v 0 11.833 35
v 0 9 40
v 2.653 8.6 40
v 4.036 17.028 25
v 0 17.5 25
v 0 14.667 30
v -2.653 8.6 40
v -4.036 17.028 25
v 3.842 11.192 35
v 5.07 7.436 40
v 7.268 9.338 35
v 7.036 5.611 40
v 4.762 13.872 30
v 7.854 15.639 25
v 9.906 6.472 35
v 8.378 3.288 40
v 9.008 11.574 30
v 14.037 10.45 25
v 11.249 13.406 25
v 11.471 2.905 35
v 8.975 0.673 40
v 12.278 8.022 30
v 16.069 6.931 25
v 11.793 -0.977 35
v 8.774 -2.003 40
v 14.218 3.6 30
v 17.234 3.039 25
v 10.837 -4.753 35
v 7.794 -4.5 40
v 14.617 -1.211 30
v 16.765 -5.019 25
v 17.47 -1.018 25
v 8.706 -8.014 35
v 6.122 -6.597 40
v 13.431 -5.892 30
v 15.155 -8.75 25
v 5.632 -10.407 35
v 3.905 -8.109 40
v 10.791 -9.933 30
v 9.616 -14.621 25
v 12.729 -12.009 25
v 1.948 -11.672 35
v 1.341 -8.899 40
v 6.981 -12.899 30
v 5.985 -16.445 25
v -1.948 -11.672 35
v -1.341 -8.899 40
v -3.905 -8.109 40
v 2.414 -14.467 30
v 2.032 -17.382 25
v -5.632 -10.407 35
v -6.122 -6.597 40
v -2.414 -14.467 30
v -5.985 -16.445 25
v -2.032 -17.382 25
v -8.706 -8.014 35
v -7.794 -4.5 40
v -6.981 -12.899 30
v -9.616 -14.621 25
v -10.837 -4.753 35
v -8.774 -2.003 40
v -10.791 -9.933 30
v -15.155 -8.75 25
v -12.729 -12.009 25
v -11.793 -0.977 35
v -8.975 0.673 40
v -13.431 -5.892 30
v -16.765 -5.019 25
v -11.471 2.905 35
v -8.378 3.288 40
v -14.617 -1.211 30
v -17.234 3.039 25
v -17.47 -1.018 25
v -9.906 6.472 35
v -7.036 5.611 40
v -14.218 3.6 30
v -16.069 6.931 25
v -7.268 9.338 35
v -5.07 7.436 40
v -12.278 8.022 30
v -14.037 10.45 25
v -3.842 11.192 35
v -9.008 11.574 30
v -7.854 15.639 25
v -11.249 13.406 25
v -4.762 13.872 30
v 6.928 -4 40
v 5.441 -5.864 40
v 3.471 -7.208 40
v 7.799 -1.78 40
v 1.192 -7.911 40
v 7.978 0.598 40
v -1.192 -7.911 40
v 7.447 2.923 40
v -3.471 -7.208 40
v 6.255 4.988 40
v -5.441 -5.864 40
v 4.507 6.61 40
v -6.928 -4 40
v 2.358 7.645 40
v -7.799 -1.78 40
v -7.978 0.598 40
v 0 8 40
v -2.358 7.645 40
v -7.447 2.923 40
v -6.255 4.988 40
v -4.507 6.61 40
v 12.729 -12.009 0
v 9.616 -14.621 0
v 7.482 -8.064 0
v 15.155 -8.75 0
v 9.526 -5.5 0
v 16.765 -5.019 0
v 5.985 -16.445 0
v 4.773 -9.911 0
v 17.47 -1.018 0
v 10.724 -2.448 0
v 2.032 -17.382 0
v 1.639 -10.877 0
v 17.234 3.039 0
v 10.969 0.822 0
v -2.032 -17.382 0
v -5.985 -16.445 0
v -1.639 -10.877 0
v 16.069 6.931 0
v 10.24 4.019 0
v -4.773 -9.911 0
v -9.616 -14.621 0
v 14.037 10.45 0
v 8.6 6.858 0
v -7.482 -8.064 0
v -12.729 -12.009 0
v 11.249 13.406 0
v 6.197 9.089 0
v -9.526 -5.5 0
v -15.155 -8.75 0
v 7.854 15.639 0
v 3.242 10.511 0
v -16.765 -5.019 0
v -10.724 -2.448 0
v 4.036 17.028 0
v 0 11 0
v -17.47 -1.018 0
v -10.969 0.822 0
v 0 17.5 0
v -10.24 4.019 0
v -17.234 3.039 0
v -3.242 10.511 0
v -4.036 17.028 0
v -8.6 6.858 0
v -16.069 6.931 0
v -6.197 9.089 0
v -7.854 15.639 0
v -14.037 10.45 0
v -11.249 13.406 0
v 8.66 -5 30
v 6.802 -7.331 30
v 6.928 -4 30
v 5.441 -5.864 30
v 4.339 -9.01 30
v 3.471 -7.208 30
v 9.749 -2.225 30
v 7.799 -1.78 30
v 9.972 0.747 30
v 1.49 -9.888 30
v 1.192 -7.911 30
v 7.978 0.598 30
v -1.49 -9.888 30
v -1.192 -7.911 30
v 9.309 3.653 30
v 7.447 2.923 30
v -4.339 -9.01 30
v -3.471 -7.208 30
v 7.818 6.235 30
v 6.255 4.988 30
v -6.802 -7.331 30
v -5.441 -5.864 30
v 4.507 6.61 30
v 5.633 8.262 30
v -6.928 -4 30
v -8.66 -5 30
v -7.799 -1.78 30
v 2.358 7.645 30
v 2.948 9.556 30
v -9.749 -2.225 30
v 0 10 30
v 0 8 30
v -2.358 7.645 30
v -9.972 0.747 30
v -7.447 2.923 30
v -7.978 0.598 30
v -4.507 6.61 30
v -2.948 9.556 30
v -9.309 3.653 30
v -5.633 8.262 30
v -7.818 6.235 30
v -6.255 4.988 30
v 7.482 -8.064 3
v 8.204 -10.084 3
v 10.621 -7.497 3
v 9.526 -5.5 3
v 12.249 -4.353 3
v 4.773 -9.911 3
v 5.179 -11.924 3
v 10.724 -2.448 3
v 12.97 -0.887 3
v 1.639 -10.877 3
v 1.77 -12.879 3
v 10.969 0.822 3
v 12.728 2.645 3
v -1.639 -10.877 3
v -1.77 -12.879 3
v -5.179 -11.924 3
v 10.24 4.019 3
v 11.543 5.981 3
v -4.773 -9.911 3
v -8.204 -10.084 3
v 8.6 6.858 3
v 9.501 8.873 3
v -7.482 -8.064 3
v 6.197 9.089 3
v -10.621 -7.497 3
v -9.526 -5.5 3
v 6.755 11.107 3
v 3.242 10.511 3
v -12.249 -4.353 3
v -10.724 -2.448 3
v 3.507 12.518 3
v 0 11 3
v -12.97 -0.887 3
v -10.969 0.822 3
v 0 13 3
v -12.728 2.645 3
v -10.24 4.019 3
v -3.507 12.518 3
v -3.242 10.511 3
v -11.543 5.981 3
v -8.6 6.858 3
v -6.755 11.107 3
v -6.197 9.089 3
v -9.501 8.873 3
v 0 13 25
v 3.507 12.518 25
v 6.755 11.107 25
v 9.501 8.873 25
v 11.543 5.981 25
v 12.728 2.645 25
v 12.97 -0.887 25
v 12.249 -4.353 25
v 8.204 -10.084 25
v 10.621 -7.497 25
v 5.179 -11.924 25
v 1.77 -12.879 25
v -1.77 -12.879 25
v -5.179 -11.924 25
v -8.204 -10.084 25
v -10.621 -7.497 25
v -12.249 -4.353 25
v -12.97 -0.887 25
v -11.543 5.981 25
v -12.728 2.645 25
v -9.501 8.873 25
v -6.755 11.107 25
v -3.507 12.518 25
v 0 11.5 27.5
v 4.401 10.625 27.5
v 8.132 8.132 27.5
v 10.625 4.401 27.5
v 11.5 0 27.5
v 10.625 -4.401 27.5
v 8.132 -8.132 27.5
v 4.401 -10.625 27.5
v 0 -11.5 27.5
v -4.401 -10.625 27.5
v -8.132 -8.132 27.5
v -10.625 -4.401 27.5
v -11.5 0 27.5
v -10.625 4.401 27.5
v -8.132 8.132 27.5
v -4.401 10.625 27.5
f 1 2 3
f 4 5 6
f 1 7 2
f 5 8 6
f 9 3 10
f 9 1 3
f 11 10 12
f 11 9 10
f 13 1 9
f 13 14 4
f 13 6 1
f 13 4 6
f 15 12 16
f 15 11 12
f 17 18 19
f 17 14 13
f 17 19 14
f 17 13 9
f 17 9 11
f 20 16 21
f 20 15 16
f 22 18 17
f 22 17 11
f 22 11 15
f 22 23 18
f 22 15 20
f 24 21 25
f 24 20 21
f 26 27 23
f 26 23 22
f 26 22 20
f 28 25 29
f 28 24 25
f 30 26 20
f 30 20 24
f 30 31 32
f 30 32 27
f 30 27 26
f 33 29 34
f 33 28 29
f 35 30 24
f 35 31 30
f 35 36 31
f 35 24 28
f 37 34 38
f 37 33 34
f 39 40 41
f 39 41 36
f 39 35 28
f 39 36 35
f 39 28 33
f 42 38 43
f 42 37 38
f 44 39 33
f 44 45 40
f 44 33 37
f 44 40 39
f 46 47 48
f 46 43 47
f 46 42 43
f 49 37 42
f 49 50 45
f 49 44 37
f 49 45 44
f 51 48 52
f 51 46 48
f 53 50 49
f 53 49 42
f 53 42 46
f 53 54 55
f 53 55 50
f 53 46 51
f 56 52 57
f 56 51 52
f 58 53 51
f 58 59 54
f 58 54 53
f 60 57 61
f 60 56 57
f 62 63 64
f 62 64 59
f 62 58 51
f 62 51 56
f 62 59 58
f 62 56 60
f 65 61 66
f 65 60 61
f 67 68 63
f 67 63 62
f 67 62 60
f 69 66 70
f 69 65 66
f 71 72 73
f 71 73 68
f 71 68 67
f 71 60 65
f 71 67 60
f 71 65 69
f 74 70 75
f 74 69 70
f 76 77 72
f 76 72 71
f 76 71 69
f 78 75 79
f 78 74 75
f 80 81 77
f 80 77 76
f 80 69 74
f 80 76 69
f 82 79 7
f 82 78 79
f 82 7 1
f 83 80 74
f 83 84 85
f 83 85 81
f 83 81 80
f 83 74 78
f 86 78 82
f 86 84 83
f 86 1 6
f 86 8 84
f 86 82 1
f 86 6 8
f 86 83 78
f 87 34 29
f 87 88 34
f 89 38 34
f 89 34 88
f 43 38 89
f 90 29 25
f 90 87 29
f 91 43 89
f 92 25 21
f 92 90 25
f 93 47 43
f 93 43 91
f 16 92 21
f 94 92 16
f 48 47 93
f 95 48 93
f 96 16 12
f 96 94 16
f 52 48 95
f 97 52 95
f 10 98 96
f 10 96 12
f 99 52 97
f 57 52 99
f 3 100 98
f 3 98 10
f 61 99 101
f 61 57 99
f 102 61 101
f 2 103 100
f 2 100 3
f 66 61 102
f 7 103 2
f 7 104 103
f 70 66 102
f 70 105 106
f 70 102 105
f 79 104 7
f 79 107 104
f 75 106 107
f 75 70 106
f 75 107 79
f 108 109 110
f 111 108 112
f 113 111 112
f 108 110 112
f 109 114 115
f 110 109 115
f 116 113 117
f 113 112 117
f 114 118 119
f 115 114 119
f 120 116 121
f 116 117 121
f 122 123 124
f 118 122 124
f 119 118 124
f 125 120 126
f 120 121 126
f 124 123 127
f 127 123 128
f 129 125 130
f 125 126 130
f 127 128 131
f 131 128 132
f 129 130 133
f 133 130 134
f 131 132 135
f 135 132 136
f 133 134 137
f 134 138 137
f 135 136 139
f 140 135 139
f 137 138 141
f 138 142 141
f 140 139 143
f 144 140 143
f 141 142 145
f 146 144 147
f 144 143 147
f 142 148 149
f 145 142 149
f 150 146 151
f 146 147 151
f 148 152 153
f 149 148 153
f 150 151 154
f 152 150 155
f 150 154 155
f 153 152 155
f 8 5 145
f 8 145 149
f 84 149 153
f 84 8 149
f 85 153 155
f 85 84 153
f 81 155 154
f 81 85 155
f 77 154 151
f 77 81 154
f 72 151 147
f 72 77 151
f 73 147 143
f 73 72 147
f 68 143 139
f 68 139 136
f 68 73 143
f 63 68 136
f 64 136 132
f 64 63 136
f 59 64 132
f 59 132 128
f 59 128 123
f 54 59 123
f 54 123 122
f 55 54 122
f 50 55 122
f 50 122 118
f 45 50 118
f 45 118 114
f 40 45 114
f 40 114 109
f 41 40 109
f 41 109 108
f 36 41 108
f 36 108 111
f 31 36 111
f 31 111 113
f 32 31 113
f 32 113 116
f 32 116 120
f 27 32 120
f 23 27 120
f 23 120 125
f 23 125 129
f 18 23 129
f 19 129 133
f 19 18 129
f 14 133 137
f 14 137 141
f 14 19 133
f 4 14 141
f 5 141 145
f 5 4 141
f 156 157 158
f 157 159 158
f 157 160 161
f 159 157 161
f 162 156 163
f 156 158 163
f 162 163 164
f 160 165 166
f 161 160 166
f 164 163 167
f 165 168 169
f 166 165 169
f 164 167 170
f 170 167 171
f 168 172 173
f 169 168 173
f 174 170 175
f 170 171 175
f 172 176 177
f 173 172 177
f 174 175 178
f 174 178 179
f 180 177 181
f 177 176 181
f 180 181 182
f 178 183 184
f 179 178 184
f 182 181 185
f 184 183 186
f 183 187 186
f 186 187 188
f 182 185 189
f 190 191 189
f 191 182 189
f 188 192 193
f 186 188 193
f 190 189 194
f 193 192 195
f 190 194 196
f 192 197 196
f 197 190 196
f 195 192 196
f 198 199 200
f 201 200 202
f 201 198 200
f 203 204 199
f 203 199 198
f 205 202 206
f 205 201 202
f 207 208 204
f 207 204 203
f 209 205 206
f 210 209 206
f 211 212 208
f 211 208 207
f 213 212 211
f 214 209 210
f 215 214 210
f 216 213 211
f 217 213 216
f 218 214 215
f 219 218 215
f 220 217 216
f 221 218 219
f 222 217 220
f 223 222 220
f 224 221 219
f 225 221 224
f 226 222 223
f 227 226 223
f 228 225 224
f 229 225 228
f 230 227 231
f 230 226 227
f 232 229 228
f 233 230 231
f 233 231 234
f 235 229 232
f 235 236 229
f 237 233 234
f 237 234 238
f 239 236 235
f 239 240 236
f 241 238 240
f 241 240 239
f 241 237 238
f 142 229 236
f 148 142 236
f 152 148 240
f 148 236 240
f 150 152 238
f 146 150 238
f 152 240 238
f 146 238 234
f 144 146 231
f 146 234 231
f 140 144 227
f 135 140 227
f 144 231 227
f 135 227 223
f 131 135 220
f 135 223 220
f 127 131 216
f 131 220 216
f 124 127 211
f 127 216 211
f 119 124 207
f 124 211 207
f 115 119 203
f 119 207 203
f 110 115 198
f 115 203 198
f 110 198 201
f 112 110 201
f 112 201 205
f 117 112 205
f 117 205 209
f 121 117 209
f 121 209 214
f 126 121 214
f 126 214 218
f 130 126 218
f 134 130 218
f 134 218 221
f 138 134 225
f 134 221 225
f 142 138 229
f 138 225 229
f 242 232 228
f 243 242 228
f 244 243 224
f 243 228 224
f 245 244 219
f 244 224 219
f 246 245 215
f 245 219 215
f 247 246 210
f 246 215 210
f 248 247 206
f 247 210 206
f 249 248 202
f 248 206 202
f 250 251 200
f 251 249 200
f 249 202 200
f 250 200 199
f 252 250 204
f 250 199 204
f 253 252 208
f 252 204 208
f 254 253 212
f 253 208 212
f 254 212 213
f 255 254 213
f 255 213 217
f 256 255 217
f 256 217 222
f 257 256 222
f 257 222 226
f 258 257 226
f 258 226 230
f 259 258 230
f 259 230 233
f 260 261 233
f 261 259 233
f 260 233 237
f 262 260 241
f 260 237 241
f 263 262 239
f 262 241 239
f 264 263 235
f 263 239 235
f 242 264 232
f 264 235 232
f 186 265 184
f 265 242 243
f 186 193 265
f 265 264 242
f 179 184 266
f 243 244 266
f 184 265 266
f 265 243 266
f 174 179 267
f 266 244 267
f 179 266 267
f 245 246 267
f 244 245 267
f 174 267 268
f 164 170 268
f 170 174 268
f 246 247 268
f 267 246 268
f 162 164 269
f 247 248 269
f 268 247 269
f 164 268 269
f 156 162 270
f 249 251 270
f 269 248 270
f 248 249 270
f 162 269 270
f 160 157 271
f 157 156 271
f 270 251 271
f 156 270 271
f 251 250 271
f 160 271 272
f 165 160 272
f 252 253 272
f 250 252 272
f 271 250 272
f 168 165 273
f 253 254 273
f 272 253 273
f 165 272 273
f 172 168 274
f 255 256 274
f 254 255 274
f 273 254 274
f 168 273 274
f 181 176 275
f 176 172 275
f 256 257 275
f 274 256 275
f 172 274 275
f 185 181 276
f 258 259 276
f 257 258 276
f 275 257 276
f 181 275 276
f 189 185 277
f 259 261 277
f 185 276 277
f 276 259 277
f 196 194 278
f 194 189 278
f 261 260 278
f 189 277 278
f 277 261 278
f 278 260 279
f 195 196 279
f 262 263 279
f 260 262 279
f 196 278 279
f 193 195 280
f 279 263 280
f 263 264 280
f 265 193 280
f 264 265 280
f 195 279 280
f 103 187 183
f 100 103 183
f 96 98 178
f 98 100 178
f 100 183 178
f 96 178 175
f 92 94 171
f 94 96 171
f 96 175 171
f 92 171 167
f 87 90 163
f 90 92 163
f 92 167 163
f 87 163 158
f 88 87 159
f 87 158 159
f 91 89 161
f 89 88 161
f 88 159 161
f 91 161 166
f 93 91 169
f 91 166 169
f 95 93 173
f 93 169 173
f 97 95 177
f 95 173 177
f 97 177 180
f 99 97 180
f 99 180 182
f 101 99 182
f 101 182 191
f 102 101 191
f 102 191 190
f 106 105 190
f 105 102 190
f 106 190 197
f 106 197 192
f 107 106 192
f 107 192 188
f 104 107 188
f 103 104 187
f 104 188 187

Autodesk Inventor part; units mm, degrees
ref_plane "YZ Plane" through (0, 0, 0) normal (1, 0, 0) x (0, 1, 0)
ref_plane "XZ Plane" through (0, 0, 0) normal (0, 1, 0) x (-1, 0, 0)
ref_plane "XY Plane" through (0, 0, 0) normal (0, 0, 1) x (1, 0, 0)
sketch "Esquisse1" plane through (0, 0, 0) normal (1, 0, 0) x (0, 1, 0)
  line L0 (0, 0) -> (0, 36.6667)
  line L1 (17.5, 0) -> (17.5, 25)
  line L2 (17.5, 0) -> (11, 0)
  line L3 (17.5, 25) -> (9, 40)
  line L4 (9, 40) -> (8, 40)
  line L5 (8, 40) -> (8, 30)
  line L6 (8, 30) -> (10, 30)
  line L7 (10, 30) -> (13, 25)
  line L8 (13, 25) -> (13, 3)
  line L9 (13, 3) -> (11, 3)
  line L10 (11, 0) -> (11, 3)
  dimension "d0" = 35
  dimension "d1" = 16
  dimension "d2" = 1
  dimension "d3" = 2
  dimension "d4" = 26
  dimension "d7" = 5
  dimension "d8" = 10
  dimension "d11" = 30
  dimension "d12" = 22
  dimension "d13" = 3
revolve "Révolution1" add sketch "Esquisse1" angle 360 about axis through (0, 0, 0) along (0, 0, 1)
properties part number "blocage_recule_support_douille"
